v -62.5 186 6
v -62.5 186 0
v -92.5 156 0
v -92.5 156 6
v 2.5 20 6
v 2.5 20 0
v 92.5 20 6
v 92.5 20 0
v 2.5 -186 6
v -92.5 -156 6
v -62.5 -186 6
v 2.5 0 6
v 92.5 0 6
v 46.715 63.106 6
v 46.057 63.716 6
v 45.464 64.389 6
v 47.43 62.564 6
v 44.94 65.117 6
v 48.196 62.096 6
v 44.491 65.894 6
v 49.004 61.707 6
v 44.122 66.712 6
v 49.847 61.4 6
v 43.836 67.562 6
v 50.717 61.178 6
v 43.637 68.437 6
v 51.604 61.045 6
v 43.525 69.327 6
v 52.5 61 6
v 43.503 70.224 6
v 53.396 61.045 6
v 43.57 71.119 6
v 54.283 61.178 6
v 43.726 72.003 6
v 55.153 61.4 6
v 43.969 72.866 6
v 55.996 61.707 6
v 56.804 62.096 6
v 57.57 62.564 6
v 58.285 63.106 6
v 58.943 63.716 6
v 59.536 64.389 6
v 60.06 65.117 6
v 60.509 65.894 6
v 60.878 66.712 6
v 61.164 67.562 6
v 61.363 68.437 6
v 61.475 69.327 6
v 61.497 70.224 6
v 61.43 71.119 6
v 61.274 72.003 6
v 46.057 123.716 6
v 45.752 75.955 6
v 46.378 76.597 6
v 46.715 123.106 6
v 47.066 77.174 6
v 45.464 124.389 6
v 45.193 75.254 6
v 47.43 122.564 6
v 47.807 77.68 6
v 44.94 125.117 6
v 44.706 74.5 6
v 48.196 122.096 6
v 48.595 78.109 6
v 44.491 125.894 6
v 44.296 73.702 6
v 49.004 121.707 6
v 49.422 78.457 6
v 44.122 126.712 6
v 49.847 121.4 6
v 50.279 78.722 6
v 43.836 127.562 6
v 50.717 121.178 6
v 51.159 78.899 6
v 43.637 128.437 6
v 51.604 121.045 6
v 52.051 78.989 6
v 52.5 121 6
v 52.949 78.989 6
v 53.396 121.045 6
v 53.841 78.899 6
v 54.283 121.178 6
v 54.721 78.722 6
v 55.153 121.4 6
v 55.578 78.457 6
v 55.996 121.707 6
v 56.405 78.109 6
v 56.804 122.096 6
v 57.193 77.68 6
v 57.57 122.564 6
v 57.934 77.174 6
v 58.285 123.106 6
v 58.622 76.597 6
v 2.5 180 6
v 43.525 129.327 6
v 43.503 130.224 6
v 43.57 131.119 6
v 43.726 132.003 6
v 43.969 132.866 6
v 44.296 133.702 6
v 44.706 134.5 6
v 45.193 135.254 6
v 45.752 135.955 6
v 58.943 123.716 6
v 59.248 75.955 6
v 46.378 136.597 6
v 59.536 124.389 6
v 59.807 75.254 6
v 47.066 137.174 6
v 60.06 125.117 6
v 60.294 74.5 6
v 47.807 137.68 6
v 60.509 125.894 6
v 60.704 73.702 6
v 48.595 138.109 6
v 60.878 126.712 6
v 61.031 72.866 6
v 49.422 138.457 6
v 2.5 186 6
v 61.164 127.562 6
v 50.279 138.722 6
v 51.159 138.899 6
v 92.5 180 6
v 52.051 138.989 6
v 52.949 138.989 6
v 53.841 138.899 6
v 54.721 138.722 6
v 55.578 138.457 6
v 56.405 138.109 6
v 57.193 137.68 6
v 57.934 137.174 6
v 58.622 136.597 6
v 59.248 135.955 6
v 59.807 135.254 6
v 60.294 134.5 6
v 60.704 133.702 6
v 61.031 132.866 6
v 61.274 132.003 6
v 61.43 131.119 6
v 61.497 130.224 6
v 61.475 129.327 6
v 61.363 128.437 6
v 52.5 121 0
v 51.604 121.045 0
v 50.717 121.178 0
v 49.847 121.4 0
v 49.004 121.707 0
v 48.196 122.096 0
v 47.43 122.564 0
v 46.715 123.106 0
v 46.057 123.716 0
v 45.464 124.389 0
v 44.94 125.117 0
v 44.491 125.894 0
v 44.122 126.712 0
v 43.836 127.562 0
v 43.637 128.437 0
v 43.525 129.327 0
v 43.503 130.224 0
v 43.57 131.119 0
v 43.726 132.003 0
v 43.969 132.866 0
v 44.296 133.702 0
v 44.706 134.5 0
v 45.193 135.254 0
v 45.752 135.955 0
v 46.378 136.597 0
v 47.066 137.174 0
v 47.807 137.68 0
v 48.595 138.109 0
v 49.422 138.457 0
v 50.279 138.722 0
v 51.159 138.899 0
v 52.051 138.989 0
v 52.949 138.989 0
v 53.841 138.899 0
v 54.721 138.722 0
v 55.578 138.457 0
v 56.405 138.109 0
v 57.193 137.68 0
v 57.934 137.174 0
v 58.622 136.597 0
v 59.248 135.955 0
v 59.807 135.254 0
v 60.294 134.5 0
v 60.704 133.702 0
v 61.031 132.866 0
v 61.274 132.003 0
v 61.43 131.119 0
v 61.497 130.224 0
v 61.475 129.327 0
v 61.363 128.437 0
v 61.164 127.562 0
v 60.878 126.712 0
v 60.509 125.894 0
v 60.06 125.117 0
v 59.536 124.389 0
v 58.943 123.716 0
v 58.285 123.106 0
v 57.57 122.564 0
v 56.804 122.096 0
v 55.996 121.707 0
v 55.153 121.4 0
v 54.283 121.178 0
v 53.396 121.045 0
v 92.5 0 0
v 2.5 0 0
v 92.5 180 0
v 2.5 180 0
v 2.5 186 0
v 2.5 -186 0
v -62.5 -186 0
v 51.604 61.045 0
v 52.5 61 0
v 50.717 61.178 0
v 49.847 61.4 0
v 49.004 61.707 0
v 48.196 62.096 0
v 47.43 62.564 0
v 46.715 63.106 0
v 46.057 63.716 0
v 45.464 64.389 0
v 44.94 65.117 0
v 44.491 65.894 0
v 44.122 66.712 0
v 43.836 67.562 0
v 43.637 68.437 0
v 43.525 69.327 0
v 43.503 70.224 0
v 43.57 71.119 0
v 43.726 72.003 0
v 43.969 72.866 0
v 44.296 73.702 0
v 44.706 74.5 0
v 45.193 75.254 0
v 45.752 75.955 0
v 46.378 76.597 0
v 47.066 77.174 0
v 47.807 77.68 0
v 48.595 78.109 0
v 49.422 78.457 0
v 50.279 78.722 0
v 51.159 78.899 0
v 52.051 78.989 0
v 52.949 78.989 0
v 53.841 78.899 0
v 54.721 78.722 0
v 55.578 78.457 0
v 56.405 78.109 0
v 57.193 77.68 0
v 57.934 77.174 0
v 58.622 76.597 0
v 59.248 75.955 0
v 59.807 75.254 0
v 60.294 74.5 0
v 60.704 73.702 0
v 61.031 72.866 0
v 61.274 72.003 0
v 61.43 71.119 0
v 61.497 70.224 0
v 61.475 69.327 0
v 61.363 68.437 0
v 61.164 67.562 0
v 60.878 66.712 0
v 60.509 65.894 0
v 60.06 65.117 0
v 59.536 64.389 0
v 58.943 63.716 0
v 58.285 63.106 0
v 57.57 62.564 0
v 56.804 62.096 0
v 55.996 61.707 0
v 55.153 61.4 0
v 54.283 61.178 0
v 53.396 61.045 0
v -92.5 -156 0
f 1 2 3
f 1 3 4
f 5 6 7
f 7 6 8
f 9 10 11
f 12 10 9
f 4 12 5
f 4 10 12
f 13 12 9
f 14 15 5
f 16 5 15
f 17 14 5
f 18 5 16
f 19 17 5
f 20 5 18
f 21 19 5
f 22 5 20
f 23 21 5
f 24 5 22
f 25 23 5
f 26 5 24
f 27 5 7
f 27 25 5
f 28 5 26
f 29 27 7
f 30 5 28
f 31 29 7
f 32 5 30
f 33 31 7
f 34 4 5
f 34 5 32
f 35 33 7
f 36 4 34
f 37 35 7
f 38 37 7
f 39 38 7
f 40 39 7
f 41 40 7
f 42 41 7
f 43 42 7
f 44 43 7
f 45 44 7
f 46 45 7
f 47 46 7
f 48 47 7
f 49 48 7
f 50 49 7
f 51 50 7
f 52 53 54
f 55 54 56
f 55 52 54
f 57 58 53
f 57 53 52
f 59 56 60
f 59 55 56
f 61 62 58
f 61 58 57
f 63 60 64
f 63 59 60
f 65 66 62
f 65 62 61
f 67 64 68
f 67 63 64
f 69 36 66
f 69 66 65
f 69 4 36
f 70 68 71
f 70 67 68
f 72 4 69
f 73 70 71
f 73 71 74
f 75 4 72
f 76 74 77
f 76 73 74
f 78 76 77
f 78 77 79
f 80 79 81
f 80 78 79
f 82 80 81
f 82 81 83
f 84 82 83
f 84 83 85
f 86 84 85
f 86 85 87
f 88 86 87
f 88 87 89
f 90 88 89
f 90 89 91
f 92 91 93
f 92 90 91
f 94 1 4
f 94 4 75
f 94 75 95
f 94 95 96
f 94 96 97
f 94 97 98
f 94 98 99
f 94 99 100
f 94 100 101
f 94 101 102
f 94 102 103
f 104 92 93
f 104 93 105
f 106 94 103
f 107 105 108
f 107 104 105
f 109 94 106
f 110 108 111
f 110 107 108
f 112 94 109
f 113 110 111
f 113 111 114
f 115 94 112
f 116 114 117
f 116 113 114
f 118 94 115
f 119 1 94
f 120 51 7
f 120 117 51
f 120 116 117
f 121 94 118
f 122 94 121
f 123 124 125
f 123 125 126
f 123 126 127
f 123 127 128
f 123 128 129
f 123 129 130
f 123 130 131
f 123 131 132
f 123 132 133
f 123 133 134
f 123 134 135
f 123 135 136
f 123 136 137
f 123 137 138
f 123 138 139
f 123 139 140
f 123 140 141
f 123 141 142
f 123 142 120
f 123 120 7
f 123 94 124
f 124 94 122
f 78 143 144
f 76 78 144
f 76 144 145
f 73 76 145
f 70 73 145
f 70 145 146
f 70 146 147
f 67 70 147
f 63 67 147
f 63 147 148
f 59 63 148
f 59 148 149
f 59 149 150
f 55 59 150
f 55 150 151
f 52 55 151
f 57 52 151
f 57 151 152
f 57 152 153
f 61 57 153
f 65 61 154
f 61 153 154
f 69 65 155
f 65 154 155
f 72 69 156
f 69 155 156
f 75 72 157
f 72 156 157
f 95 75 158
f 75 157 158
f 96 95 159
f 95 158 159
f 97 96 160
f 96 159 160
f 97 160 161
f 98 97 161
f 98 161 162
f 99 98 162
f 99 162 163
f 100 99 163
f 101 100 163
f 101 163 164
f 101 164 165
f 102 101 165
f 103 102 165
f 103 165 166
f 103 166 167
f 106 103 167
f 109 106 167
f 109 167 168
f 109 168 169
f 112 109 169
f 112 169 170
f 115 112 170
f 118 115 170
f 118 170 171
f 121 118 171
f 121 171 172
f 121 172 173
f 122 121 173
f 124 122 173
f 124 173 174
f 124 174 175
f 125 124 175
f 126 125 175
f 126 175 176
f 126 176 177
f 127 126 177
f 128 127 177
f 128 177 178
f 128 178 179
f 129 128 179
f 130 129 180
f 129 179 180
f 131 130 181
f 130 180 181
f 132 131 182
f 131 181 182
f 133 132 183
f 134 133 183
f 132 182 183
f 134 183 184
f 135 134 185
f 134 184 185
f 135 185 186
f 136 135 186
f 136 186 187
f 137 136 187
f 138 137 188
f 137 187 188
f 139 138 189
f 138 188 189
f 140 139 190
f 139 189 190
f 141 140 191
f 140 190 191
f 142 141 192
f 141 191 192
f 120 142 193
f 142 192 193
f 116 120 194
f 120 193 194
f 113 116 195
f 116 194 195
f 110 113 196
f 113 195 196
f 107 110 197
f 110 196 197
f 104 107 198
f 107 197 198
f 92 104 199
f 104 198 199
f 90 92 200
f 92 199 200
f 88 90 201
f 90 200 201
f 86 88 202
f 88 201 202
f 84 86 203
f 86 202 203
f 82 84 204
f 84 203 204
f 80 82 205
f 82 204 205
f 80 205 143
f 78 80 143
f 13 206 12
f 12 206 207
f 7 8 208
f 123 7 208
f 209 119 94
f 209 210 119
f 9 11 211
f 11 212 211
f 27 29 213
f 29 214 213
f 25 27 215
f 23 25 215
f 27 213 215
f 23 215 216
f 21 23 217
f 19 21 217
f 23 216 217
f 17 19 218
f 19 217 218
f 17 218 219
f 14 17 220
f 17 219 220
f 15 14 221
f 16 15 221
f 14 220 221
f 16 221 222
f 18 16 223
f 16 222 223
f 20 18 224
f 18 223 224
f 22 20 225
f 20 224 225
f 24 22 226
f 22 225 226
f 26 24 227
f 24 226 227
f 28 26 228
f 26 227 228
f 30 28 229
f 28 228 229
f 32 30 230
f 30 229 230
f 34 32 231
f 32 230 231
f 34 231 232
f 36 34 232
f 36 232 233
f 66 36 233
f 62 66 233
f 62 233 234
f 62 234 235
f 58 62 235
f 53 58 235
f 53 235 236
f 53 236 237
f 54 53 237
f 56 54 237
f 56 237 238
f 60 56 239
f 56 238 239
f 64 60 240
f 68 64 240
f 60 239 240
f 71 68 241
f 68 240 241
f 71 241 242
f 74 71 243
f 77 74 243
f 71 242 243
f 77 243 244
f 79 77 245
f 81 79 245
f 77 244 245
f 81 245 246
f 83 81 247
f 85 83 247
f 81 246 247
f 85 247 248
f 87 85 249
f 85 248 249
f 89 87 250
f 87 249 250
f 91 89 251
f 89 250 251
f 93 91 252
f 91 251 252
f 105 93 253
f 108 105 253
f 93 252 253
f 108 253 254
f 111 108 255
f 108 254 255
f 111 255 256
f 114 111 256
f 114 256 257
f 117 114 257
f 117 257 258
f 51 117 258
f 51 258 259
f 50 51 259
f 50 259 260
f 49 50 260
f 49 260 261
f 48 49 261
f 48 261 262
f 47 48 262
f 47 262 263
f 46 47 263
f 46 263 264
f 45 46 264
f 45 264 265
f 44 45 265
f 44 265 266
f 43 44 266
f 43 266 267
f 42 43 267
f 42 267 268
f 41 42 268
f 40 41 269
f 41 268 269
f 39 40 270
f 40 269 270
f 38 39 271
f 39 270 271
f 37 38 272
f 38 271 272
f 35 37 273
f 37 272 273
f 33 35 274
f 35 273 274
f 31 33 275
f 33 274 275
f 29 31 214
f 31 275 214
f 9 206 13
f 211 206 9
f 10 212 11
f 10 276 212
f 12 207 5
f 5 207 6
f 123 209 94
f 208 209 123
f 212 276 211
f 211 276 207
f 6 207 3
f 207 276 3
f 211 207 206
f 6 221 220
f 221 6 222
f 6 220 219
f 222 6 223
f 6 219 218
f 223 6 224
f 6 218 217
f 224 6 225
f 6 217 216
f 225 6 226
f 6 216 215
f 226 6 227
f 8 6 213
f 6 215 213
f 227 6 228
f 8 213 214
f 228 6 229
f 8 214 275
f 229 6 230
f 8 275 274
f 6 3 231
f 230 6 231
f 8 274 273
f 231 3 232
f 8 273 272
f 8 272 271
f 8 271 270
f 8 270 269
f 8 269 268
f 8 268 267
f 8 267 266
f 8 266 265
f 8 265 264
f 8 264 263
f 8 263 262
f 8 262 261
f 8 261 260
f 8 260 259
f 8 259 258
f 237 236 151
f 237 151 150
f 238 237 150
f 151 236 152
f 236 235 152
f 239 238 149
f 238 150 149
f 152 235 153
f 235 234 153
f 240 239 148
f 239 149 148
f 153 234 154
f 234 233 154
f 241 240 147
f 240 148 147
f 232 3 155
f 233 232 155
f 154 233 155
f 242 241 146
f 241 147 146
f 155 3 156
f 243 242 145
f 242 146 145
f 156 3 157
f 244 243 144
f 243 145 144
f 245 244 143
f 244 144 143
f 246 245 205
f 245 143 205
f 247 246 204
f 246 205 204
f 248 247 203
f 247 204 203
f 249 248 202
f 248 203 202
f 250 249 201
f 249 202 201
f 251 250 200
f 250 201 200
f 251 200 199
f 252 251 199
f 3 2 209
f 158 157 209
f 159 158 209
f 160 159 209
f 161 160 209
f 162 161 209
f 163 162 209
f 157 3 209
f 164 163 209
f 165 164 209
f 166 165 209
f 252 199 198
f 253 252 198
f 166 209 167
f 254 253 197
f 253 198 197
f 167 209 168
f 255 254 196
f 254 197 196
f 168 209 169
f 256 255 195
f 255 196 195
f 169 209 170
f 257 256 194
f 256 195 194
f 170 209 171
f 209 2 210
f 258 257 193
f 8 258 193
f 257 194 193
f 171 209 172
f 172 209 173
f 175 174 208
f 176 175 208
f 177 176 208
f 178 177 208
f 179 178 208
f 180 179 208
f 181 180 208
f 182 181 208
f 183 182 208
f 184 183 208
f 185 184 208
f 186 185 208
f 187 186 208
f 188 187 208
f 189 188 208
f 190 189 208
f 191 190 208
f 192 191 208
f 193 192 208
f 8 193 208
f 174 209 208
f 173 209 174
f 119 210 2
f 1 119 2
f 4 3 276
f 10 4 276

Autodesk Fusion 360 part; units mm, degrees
sketch "スケッチ1" plane through (0, 0, 0) normal (0, 0, 1) x (1, 0, 0)
  line L0 (2.5, 186) -> (-92.5, 186)
  line L1 (-92.5, 186) -> (-92.5, -186)
  line L2 (-92.5, -186) -> (2.5, -186)
  line L3 (92.5, 20) -> (92.5, 180)
  line L4 (89.5161, 180) -> (-92.5, -186) construction
  line L5 (-92.5, 186) -> (46.8836, -94.274) construction
  line L6 (2.5, 186) -> (2.5, 180)
  line L7 (2.5, 180) -> (92.5, 180)
  line L8 (-92.5, -186) -> (2.5, -186) construction
  line L9 (92.5, 0) -> (2.5, -186)
  line L10 (92.5, 0) -> (2.5, 0)
  line L11 (2.5, 0) -> (2.5, 20)
  line L12 (2.5, 20) -> (92.5, 20)
  dimension "d2" = 372
  dimension "d5" = 95
  dimension "d15" = 90
  dimension "d16" = 20
extrude "押し出し1" add sketch "スケッチ1" along normal blind 6
chamfer "面取り1" distance 30 angle 45 2 edges at (-92.5, -186, 3) (-92.5, 186, 3)
sketch "スケッチ2" plane through (0, 0, 6) normal (0, 0, 1) x (-1, 0, 0)
  line L0 (62.5, -186) -> (92.5, -156)
  line L1 (92.5, -156) -> (92.5, 156)
  line L2 (92.5, 156) -> (62.5, 186)
  line L3 (62.5, 186) -> (-2.5, 186)
  line L4 (-2.5, 186) -> (-92.5, 0)
  line L5 (-92.5, -20) -> (-92.5, -180)
  line L6 (-92.5, -180) -> (-2.5, -180)
  line L7 (-2.5, -180) -> (-2.5, -186)
  line L8 (-2.5, -186) -> (62.5, -186)
  line L9 (-92.5, -180) -> (-52.5, -180) construction
  line L10 (-52.5, -180) -> (-52.5, -130) construction
  line L11 (-52.5, -130) -> (-92.5, -130) construction
  line L12 (-92.5, -130) -> (-92.5, -180) construction
  line L13 (-52.5, -130) -> (-52.5, -70) construction
  line L14 (-92.5, 0) -> (-2.5, 0)
  line L15 (-2.5, 0) -> (-2.5, -20)
  line L16 (-2.5, -20) -> (-92.5, -20)
  point P0 (-52.5, -130)
  point P1 (-52.5, -70)
  dimension "d10" = 40
  dimension "d11" = 50
  dimension "d12" = 60
hole "穴1" at (52.5, 130, 6) at (52.5, 70, 6) direction (0, 0, -1) diameter 18 end through all
equation "d5 = 30 mm + 65 mm"
